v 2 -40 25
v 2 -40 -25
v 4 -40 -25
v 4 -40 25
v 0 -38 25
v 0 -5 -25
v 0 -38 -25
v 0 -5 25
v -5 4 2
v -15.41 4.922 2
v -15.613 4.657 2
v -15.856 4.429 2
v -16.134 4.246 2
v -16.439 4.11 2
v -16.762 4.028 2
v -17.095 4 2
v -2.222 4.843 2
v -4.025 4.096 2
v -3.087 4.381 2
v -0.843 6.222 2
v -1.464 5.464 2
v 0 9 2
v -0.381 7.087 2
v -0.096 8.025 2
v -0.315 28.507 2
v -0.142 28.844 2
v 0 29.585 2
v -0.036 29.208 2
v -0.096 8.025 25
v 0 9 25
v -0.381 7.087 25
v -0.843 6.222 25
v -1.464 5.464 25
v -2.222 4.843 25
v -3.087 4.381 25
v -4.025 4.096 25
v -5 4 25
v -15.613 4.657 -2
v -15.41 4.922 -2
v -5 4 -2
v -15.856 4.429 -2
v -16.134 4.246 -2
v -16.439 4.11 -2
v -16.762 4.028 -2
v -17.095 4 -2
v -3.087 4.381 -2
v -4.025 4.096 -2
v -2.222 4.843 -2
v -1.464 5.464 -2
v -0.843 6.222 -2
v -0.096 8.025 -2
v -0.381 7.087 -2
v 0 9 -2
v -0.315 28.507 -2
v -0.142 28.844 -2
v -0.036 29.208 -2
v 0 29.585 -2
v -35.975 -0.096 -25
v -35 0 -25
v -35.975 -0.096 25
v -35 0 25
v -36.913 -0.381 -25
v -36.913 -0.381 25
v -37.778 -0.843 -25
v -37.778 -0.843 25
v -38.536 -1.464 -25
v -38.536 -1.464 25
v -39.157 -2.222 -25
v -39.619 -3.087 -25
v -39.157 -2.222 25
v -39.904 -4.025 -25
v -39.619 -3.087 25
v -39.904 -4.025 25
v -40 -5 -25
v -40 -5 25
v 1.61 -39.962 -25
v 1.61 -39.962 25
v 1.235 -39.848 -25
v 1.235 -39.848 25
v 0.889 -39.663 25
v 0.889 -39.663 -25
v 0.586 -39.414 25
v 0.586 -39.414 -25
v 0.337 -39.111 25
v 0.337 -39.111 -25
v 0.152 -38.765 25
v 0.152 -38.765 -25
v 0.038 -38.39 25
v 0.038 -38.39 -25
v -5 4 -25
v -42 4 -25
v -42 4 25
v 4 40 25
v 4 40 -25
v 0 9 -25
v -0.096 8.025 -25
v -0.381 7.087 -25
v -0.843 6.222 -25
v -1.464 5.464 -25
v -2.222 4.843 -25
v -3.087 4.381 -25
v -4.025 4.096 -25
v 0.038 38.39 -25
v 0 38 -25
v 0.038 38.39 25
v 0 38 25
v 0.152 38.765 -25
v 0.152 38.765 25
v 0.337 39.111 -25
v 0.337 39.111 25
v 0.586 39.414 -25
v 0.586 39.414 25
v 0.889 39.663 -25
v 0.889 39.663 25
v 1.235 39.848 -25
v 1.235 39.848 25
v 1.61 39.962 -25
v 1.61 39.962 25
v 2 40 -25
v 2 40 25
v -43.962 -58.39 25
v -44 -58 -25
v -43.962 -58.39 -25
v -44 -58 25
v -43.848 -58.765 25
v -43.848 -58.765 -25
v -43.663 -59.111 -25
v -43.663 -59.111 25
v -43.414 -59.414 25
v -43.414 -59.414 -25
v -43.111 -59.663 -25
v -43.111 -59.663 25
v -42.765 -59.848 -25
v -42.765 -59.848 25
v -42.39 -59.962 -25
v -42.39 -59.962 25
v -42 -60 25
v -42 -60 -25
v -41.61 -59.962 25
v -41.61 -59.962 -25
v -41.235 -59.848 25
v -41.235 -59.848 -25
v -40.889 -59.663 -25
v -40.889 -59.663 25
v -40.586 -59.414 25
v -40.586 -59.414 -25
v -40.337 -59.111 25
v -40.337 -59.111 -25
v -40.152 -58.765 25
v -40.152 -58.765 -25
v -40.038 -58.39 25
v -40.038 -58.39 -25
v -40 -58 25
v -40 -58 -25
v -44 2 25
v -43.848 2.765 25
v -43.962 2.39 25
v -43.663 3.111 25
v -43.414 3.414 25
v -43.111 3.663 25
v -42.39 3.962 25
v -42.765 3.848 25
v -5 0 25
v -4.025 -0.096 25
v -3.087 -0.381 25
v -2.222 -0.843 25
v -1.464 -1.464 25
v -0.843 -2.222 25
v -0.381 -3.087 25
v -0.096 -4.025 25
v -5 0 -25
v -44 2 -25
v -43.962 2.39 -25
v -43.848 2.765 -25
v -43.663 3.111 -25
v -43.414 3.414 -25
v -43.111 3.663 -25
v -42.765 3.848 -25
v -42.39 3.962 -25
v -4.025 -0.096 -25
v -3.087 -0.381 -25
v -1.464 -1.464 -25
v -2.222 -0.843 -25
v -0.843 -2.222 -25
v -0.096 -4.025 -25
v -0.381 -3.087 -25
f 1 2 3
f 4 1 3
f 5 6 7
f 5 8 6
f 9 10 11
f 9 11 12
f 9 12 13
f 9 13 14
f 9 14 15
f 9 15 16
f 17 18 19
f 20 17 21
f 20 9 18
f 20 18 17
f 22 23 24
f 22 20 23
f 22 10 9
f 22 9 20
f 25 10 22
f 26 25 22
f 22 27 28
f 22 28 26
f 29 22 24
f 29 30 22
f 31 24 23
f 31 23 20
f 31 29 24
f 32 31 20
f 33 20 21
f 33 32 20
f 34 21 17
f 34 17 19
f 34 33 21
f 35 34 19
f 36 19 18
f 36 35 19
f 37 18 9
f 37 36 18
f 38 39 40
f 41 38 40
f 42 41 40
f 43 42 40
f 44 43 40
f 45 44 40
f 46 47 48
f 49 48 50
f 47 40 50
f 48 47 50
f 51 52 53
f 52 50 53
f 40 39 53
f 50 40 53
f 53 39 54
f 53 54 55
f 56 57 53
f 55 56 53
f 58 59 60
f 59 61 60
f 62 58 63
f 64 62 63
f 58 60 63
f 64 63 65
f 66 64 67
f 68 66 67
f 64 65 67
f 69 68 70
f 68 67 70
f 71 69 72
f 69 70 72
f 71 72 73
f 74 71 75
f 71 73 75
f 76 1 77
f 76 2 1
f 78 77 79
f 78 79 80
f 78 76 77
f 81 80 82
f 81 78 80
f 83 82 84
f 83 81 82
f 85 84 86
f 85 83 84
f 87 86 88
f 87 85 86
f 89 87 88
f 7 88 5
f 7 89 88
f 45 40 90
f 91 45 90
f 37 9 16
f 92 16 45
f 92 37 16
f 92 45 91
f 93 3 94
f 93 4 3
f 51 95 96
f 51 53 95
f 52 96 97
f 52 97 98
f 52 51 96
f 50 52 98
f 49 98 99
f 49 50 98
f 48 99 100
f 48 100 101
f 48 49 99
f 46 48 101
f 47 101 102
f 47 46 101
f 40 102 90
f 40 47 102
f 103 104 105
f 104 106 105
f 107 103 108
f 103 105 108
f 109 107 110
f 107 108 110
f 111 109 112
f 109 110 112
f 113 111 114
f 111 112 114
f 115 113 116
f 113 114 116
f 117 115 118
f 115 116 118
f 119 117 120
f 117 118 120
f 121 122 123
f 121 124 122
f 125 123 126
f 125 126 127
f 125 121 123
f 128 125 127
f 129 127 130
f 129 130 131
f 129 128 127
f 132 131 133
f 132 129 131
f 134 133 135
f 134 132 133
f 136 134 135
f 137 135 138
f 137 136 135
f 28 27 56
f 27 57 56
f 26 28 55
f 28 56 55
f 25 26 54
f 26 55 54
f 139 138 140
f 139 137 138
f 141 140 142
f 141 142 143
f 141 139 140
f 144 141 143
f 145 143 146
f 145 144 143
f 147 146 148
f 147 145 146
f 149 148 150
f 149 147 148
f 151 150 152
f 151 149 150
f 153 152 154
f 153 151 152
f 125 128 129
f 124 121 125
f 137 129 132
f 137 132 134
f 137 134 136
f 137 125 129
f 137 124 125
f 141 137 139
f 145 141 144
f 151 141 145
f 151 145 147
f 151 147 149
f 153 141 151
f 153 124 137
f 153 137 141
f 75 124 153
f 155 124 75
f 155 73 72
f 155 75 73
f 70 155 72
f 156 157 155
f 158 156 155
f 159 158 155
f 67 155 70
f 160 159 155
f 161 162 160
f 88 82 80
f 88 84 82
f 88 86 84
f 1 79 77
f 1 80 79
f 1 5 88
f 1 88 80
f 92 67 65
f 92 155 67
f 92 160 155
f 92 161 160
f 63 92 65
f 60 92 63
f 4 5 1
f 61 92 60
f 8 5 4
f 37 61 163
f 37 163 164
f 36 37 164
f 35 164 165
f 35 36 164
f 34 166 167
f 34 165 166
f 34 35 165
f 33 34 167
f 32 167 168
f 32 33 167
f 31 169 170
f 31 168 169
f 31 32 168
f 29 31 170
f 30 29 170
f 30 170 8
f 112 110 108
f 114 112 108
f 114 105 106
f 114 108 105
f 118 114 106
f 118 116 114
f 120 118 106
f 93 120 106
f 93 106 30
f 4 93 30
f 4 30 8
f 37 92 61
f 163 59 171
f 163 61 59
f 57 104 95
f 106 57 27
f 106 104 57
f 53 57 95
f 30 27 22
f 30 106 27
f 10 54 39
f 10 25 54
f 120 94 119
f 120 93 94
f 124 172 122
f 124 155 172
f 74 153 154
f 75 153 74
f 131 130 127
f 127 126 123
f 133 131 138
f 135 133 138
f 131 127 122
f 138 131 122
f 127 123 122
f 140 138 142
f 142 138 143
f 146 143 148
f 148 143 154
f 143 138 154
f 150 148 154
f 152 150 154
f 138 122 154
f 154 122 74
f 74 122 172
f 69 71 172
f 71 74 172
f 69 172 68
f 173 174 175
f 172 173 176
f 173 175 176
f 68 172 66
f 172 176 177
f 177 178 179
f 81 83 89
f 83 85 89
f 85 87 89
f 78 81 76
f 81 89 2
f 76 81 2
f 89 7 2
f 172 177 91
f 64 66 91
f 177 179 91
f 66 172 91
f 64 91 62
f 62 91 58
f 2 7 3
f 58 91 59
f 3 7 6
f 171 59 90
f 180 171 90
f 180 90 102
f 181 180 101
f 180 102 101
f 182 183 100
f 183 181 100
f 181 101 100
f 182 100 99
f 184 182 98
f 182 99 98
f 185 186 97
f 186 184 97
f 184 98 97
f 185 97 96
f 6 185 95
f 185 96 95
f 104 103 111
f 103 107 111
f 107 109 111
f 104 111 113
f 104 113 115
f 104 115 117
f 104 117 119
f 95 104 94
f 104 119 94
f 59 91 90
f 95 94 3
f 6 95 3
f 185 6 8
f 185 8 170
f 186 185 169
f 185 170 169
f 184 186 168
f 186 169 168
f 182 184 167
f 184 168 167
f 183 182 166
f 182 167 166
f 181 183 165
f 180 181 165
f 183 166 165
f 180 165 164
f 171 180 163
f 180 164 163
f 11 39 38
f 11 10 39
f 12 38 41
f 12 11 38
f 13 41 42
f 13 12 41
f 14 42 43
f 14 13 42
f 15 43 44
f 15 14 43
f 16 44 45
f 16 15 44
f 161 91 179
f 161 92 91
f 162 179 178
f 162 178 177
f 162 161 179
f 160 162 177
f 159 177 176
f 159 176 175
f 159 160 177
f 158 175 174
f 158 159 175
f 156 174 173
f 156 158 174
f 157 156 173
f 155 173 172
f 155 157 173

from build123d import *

# Parameters (mm, degrees)
F1_DEPTH      = 25
F2_DEPTH      = 25
F3_DEPTH      = 2
F3_DEPTH_BACK = 2
F4_R          = 5
F5_R          = 1.99999


# Not quite as in the source:
# - a fillet or chamfer is up to 0.001 mm smaller than in the source, because OpenCascade refuses the exact size


with BuildPart() as f1:
    # F0 (on Top) → F1 (new body)
    with BuildSketch(Plane.XY):
        Polygon((-40, 0), (-40, 4), (-44, 4), (-44, -60), (-40, -60), align=None)
        Polygon((0, 0), (0, 4), (-16, 4), (-40, 4), (-40, 0), align=None)
        Polygon((4, 40), (0, 40), (0, 29), (0, 4), (0, 0), (0, -40), (4, -40), align=None)
    extrude(amount=F1_DEPTH)

    # F0 (on Top) → F2 (join)
    with BuildSketch(Plane.XY):
        Polygon((4, 40), (0, 40), (0, 29), (0, 4), (0, 0), (0, -40), (4, -40), align=None)
        Polygon((0, 0), (0, 4), (-16, 4), (-40, 4), (-40, 0), align=None)
        Polygon((-40, 0), (-40, 4), (-44, 4), (-44, -60), (-40, -60), align=None)
    extrude(amount=-F2_DEPTH)

    # F0 (on Top) → F3 (join, two sides)
    with BuildSketch(Plane.XY) as f3_sk:
        Polygon((0, 4), (0, 29), (-16, 4), align=None)
    extrude(amount=F3_DEPTH)
    extrude(f3_sk.sketch, amount=-F3_DEPTH_BACK)

    # F4
    f4_edges = [f1.edges().sort_by_distance(p)[0] for p in [
        (-40, 0, 0),
        (0, 0, 0),
        (0, 4, 13.5),
        (0, 4, -13.5),
    ]]
    fillet(f4_edges, radius=F4_R)

    # F5 (radius 2 in the source; OpenCascade refuses exactly that, so slightly less here)
    f5_edges = [f1.edges().sort_by_distance(p)[0] for p in [
        (-44, 4, 0),
        (0, 40, 0),
        (-44, -60, 0),
        (-40, -60, 0),
        (0, -40, 0),
        (-16, 4, 0),
        (0, 29, 0),
    ]]
    fillet(f5_edges, radius=F5_R)


solid = f1.part
